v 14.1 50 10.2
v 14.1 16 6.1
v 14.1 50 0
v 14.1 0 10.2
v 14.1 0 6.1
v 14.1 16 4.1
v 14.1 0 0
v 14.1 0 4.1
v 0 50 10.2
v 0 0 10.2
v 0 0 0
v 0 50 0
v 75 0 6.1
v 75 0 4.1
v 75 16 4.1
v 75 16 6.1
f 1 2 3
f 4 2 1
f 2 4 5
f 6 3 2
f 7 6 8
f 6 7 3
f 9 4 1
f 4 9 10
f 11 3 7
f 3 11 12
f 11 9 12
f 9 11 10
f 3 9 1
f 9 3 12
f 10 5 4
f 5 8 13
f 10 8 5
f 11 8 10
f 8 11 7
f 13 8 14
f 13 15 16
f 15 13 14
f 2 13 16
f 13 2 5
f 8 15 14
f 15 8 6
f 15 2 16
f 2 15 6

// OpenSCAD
module try_square(base_thickness,
                  base_height,
                  wing_thickness,
                  wing_height,
                  width,
                  length) {
    union() {
        translate([0,0,0]) 
            cube([base_height, width,
                  base_thickness]);
        translate([0, 0,
                   (base_thickness - wing_thickness)/2]) 
            cube([length, wing_height,
                  wing_thickness]);
    }
};
    
try_square(10.2, 14.1, 2, 16, 50, 75);
